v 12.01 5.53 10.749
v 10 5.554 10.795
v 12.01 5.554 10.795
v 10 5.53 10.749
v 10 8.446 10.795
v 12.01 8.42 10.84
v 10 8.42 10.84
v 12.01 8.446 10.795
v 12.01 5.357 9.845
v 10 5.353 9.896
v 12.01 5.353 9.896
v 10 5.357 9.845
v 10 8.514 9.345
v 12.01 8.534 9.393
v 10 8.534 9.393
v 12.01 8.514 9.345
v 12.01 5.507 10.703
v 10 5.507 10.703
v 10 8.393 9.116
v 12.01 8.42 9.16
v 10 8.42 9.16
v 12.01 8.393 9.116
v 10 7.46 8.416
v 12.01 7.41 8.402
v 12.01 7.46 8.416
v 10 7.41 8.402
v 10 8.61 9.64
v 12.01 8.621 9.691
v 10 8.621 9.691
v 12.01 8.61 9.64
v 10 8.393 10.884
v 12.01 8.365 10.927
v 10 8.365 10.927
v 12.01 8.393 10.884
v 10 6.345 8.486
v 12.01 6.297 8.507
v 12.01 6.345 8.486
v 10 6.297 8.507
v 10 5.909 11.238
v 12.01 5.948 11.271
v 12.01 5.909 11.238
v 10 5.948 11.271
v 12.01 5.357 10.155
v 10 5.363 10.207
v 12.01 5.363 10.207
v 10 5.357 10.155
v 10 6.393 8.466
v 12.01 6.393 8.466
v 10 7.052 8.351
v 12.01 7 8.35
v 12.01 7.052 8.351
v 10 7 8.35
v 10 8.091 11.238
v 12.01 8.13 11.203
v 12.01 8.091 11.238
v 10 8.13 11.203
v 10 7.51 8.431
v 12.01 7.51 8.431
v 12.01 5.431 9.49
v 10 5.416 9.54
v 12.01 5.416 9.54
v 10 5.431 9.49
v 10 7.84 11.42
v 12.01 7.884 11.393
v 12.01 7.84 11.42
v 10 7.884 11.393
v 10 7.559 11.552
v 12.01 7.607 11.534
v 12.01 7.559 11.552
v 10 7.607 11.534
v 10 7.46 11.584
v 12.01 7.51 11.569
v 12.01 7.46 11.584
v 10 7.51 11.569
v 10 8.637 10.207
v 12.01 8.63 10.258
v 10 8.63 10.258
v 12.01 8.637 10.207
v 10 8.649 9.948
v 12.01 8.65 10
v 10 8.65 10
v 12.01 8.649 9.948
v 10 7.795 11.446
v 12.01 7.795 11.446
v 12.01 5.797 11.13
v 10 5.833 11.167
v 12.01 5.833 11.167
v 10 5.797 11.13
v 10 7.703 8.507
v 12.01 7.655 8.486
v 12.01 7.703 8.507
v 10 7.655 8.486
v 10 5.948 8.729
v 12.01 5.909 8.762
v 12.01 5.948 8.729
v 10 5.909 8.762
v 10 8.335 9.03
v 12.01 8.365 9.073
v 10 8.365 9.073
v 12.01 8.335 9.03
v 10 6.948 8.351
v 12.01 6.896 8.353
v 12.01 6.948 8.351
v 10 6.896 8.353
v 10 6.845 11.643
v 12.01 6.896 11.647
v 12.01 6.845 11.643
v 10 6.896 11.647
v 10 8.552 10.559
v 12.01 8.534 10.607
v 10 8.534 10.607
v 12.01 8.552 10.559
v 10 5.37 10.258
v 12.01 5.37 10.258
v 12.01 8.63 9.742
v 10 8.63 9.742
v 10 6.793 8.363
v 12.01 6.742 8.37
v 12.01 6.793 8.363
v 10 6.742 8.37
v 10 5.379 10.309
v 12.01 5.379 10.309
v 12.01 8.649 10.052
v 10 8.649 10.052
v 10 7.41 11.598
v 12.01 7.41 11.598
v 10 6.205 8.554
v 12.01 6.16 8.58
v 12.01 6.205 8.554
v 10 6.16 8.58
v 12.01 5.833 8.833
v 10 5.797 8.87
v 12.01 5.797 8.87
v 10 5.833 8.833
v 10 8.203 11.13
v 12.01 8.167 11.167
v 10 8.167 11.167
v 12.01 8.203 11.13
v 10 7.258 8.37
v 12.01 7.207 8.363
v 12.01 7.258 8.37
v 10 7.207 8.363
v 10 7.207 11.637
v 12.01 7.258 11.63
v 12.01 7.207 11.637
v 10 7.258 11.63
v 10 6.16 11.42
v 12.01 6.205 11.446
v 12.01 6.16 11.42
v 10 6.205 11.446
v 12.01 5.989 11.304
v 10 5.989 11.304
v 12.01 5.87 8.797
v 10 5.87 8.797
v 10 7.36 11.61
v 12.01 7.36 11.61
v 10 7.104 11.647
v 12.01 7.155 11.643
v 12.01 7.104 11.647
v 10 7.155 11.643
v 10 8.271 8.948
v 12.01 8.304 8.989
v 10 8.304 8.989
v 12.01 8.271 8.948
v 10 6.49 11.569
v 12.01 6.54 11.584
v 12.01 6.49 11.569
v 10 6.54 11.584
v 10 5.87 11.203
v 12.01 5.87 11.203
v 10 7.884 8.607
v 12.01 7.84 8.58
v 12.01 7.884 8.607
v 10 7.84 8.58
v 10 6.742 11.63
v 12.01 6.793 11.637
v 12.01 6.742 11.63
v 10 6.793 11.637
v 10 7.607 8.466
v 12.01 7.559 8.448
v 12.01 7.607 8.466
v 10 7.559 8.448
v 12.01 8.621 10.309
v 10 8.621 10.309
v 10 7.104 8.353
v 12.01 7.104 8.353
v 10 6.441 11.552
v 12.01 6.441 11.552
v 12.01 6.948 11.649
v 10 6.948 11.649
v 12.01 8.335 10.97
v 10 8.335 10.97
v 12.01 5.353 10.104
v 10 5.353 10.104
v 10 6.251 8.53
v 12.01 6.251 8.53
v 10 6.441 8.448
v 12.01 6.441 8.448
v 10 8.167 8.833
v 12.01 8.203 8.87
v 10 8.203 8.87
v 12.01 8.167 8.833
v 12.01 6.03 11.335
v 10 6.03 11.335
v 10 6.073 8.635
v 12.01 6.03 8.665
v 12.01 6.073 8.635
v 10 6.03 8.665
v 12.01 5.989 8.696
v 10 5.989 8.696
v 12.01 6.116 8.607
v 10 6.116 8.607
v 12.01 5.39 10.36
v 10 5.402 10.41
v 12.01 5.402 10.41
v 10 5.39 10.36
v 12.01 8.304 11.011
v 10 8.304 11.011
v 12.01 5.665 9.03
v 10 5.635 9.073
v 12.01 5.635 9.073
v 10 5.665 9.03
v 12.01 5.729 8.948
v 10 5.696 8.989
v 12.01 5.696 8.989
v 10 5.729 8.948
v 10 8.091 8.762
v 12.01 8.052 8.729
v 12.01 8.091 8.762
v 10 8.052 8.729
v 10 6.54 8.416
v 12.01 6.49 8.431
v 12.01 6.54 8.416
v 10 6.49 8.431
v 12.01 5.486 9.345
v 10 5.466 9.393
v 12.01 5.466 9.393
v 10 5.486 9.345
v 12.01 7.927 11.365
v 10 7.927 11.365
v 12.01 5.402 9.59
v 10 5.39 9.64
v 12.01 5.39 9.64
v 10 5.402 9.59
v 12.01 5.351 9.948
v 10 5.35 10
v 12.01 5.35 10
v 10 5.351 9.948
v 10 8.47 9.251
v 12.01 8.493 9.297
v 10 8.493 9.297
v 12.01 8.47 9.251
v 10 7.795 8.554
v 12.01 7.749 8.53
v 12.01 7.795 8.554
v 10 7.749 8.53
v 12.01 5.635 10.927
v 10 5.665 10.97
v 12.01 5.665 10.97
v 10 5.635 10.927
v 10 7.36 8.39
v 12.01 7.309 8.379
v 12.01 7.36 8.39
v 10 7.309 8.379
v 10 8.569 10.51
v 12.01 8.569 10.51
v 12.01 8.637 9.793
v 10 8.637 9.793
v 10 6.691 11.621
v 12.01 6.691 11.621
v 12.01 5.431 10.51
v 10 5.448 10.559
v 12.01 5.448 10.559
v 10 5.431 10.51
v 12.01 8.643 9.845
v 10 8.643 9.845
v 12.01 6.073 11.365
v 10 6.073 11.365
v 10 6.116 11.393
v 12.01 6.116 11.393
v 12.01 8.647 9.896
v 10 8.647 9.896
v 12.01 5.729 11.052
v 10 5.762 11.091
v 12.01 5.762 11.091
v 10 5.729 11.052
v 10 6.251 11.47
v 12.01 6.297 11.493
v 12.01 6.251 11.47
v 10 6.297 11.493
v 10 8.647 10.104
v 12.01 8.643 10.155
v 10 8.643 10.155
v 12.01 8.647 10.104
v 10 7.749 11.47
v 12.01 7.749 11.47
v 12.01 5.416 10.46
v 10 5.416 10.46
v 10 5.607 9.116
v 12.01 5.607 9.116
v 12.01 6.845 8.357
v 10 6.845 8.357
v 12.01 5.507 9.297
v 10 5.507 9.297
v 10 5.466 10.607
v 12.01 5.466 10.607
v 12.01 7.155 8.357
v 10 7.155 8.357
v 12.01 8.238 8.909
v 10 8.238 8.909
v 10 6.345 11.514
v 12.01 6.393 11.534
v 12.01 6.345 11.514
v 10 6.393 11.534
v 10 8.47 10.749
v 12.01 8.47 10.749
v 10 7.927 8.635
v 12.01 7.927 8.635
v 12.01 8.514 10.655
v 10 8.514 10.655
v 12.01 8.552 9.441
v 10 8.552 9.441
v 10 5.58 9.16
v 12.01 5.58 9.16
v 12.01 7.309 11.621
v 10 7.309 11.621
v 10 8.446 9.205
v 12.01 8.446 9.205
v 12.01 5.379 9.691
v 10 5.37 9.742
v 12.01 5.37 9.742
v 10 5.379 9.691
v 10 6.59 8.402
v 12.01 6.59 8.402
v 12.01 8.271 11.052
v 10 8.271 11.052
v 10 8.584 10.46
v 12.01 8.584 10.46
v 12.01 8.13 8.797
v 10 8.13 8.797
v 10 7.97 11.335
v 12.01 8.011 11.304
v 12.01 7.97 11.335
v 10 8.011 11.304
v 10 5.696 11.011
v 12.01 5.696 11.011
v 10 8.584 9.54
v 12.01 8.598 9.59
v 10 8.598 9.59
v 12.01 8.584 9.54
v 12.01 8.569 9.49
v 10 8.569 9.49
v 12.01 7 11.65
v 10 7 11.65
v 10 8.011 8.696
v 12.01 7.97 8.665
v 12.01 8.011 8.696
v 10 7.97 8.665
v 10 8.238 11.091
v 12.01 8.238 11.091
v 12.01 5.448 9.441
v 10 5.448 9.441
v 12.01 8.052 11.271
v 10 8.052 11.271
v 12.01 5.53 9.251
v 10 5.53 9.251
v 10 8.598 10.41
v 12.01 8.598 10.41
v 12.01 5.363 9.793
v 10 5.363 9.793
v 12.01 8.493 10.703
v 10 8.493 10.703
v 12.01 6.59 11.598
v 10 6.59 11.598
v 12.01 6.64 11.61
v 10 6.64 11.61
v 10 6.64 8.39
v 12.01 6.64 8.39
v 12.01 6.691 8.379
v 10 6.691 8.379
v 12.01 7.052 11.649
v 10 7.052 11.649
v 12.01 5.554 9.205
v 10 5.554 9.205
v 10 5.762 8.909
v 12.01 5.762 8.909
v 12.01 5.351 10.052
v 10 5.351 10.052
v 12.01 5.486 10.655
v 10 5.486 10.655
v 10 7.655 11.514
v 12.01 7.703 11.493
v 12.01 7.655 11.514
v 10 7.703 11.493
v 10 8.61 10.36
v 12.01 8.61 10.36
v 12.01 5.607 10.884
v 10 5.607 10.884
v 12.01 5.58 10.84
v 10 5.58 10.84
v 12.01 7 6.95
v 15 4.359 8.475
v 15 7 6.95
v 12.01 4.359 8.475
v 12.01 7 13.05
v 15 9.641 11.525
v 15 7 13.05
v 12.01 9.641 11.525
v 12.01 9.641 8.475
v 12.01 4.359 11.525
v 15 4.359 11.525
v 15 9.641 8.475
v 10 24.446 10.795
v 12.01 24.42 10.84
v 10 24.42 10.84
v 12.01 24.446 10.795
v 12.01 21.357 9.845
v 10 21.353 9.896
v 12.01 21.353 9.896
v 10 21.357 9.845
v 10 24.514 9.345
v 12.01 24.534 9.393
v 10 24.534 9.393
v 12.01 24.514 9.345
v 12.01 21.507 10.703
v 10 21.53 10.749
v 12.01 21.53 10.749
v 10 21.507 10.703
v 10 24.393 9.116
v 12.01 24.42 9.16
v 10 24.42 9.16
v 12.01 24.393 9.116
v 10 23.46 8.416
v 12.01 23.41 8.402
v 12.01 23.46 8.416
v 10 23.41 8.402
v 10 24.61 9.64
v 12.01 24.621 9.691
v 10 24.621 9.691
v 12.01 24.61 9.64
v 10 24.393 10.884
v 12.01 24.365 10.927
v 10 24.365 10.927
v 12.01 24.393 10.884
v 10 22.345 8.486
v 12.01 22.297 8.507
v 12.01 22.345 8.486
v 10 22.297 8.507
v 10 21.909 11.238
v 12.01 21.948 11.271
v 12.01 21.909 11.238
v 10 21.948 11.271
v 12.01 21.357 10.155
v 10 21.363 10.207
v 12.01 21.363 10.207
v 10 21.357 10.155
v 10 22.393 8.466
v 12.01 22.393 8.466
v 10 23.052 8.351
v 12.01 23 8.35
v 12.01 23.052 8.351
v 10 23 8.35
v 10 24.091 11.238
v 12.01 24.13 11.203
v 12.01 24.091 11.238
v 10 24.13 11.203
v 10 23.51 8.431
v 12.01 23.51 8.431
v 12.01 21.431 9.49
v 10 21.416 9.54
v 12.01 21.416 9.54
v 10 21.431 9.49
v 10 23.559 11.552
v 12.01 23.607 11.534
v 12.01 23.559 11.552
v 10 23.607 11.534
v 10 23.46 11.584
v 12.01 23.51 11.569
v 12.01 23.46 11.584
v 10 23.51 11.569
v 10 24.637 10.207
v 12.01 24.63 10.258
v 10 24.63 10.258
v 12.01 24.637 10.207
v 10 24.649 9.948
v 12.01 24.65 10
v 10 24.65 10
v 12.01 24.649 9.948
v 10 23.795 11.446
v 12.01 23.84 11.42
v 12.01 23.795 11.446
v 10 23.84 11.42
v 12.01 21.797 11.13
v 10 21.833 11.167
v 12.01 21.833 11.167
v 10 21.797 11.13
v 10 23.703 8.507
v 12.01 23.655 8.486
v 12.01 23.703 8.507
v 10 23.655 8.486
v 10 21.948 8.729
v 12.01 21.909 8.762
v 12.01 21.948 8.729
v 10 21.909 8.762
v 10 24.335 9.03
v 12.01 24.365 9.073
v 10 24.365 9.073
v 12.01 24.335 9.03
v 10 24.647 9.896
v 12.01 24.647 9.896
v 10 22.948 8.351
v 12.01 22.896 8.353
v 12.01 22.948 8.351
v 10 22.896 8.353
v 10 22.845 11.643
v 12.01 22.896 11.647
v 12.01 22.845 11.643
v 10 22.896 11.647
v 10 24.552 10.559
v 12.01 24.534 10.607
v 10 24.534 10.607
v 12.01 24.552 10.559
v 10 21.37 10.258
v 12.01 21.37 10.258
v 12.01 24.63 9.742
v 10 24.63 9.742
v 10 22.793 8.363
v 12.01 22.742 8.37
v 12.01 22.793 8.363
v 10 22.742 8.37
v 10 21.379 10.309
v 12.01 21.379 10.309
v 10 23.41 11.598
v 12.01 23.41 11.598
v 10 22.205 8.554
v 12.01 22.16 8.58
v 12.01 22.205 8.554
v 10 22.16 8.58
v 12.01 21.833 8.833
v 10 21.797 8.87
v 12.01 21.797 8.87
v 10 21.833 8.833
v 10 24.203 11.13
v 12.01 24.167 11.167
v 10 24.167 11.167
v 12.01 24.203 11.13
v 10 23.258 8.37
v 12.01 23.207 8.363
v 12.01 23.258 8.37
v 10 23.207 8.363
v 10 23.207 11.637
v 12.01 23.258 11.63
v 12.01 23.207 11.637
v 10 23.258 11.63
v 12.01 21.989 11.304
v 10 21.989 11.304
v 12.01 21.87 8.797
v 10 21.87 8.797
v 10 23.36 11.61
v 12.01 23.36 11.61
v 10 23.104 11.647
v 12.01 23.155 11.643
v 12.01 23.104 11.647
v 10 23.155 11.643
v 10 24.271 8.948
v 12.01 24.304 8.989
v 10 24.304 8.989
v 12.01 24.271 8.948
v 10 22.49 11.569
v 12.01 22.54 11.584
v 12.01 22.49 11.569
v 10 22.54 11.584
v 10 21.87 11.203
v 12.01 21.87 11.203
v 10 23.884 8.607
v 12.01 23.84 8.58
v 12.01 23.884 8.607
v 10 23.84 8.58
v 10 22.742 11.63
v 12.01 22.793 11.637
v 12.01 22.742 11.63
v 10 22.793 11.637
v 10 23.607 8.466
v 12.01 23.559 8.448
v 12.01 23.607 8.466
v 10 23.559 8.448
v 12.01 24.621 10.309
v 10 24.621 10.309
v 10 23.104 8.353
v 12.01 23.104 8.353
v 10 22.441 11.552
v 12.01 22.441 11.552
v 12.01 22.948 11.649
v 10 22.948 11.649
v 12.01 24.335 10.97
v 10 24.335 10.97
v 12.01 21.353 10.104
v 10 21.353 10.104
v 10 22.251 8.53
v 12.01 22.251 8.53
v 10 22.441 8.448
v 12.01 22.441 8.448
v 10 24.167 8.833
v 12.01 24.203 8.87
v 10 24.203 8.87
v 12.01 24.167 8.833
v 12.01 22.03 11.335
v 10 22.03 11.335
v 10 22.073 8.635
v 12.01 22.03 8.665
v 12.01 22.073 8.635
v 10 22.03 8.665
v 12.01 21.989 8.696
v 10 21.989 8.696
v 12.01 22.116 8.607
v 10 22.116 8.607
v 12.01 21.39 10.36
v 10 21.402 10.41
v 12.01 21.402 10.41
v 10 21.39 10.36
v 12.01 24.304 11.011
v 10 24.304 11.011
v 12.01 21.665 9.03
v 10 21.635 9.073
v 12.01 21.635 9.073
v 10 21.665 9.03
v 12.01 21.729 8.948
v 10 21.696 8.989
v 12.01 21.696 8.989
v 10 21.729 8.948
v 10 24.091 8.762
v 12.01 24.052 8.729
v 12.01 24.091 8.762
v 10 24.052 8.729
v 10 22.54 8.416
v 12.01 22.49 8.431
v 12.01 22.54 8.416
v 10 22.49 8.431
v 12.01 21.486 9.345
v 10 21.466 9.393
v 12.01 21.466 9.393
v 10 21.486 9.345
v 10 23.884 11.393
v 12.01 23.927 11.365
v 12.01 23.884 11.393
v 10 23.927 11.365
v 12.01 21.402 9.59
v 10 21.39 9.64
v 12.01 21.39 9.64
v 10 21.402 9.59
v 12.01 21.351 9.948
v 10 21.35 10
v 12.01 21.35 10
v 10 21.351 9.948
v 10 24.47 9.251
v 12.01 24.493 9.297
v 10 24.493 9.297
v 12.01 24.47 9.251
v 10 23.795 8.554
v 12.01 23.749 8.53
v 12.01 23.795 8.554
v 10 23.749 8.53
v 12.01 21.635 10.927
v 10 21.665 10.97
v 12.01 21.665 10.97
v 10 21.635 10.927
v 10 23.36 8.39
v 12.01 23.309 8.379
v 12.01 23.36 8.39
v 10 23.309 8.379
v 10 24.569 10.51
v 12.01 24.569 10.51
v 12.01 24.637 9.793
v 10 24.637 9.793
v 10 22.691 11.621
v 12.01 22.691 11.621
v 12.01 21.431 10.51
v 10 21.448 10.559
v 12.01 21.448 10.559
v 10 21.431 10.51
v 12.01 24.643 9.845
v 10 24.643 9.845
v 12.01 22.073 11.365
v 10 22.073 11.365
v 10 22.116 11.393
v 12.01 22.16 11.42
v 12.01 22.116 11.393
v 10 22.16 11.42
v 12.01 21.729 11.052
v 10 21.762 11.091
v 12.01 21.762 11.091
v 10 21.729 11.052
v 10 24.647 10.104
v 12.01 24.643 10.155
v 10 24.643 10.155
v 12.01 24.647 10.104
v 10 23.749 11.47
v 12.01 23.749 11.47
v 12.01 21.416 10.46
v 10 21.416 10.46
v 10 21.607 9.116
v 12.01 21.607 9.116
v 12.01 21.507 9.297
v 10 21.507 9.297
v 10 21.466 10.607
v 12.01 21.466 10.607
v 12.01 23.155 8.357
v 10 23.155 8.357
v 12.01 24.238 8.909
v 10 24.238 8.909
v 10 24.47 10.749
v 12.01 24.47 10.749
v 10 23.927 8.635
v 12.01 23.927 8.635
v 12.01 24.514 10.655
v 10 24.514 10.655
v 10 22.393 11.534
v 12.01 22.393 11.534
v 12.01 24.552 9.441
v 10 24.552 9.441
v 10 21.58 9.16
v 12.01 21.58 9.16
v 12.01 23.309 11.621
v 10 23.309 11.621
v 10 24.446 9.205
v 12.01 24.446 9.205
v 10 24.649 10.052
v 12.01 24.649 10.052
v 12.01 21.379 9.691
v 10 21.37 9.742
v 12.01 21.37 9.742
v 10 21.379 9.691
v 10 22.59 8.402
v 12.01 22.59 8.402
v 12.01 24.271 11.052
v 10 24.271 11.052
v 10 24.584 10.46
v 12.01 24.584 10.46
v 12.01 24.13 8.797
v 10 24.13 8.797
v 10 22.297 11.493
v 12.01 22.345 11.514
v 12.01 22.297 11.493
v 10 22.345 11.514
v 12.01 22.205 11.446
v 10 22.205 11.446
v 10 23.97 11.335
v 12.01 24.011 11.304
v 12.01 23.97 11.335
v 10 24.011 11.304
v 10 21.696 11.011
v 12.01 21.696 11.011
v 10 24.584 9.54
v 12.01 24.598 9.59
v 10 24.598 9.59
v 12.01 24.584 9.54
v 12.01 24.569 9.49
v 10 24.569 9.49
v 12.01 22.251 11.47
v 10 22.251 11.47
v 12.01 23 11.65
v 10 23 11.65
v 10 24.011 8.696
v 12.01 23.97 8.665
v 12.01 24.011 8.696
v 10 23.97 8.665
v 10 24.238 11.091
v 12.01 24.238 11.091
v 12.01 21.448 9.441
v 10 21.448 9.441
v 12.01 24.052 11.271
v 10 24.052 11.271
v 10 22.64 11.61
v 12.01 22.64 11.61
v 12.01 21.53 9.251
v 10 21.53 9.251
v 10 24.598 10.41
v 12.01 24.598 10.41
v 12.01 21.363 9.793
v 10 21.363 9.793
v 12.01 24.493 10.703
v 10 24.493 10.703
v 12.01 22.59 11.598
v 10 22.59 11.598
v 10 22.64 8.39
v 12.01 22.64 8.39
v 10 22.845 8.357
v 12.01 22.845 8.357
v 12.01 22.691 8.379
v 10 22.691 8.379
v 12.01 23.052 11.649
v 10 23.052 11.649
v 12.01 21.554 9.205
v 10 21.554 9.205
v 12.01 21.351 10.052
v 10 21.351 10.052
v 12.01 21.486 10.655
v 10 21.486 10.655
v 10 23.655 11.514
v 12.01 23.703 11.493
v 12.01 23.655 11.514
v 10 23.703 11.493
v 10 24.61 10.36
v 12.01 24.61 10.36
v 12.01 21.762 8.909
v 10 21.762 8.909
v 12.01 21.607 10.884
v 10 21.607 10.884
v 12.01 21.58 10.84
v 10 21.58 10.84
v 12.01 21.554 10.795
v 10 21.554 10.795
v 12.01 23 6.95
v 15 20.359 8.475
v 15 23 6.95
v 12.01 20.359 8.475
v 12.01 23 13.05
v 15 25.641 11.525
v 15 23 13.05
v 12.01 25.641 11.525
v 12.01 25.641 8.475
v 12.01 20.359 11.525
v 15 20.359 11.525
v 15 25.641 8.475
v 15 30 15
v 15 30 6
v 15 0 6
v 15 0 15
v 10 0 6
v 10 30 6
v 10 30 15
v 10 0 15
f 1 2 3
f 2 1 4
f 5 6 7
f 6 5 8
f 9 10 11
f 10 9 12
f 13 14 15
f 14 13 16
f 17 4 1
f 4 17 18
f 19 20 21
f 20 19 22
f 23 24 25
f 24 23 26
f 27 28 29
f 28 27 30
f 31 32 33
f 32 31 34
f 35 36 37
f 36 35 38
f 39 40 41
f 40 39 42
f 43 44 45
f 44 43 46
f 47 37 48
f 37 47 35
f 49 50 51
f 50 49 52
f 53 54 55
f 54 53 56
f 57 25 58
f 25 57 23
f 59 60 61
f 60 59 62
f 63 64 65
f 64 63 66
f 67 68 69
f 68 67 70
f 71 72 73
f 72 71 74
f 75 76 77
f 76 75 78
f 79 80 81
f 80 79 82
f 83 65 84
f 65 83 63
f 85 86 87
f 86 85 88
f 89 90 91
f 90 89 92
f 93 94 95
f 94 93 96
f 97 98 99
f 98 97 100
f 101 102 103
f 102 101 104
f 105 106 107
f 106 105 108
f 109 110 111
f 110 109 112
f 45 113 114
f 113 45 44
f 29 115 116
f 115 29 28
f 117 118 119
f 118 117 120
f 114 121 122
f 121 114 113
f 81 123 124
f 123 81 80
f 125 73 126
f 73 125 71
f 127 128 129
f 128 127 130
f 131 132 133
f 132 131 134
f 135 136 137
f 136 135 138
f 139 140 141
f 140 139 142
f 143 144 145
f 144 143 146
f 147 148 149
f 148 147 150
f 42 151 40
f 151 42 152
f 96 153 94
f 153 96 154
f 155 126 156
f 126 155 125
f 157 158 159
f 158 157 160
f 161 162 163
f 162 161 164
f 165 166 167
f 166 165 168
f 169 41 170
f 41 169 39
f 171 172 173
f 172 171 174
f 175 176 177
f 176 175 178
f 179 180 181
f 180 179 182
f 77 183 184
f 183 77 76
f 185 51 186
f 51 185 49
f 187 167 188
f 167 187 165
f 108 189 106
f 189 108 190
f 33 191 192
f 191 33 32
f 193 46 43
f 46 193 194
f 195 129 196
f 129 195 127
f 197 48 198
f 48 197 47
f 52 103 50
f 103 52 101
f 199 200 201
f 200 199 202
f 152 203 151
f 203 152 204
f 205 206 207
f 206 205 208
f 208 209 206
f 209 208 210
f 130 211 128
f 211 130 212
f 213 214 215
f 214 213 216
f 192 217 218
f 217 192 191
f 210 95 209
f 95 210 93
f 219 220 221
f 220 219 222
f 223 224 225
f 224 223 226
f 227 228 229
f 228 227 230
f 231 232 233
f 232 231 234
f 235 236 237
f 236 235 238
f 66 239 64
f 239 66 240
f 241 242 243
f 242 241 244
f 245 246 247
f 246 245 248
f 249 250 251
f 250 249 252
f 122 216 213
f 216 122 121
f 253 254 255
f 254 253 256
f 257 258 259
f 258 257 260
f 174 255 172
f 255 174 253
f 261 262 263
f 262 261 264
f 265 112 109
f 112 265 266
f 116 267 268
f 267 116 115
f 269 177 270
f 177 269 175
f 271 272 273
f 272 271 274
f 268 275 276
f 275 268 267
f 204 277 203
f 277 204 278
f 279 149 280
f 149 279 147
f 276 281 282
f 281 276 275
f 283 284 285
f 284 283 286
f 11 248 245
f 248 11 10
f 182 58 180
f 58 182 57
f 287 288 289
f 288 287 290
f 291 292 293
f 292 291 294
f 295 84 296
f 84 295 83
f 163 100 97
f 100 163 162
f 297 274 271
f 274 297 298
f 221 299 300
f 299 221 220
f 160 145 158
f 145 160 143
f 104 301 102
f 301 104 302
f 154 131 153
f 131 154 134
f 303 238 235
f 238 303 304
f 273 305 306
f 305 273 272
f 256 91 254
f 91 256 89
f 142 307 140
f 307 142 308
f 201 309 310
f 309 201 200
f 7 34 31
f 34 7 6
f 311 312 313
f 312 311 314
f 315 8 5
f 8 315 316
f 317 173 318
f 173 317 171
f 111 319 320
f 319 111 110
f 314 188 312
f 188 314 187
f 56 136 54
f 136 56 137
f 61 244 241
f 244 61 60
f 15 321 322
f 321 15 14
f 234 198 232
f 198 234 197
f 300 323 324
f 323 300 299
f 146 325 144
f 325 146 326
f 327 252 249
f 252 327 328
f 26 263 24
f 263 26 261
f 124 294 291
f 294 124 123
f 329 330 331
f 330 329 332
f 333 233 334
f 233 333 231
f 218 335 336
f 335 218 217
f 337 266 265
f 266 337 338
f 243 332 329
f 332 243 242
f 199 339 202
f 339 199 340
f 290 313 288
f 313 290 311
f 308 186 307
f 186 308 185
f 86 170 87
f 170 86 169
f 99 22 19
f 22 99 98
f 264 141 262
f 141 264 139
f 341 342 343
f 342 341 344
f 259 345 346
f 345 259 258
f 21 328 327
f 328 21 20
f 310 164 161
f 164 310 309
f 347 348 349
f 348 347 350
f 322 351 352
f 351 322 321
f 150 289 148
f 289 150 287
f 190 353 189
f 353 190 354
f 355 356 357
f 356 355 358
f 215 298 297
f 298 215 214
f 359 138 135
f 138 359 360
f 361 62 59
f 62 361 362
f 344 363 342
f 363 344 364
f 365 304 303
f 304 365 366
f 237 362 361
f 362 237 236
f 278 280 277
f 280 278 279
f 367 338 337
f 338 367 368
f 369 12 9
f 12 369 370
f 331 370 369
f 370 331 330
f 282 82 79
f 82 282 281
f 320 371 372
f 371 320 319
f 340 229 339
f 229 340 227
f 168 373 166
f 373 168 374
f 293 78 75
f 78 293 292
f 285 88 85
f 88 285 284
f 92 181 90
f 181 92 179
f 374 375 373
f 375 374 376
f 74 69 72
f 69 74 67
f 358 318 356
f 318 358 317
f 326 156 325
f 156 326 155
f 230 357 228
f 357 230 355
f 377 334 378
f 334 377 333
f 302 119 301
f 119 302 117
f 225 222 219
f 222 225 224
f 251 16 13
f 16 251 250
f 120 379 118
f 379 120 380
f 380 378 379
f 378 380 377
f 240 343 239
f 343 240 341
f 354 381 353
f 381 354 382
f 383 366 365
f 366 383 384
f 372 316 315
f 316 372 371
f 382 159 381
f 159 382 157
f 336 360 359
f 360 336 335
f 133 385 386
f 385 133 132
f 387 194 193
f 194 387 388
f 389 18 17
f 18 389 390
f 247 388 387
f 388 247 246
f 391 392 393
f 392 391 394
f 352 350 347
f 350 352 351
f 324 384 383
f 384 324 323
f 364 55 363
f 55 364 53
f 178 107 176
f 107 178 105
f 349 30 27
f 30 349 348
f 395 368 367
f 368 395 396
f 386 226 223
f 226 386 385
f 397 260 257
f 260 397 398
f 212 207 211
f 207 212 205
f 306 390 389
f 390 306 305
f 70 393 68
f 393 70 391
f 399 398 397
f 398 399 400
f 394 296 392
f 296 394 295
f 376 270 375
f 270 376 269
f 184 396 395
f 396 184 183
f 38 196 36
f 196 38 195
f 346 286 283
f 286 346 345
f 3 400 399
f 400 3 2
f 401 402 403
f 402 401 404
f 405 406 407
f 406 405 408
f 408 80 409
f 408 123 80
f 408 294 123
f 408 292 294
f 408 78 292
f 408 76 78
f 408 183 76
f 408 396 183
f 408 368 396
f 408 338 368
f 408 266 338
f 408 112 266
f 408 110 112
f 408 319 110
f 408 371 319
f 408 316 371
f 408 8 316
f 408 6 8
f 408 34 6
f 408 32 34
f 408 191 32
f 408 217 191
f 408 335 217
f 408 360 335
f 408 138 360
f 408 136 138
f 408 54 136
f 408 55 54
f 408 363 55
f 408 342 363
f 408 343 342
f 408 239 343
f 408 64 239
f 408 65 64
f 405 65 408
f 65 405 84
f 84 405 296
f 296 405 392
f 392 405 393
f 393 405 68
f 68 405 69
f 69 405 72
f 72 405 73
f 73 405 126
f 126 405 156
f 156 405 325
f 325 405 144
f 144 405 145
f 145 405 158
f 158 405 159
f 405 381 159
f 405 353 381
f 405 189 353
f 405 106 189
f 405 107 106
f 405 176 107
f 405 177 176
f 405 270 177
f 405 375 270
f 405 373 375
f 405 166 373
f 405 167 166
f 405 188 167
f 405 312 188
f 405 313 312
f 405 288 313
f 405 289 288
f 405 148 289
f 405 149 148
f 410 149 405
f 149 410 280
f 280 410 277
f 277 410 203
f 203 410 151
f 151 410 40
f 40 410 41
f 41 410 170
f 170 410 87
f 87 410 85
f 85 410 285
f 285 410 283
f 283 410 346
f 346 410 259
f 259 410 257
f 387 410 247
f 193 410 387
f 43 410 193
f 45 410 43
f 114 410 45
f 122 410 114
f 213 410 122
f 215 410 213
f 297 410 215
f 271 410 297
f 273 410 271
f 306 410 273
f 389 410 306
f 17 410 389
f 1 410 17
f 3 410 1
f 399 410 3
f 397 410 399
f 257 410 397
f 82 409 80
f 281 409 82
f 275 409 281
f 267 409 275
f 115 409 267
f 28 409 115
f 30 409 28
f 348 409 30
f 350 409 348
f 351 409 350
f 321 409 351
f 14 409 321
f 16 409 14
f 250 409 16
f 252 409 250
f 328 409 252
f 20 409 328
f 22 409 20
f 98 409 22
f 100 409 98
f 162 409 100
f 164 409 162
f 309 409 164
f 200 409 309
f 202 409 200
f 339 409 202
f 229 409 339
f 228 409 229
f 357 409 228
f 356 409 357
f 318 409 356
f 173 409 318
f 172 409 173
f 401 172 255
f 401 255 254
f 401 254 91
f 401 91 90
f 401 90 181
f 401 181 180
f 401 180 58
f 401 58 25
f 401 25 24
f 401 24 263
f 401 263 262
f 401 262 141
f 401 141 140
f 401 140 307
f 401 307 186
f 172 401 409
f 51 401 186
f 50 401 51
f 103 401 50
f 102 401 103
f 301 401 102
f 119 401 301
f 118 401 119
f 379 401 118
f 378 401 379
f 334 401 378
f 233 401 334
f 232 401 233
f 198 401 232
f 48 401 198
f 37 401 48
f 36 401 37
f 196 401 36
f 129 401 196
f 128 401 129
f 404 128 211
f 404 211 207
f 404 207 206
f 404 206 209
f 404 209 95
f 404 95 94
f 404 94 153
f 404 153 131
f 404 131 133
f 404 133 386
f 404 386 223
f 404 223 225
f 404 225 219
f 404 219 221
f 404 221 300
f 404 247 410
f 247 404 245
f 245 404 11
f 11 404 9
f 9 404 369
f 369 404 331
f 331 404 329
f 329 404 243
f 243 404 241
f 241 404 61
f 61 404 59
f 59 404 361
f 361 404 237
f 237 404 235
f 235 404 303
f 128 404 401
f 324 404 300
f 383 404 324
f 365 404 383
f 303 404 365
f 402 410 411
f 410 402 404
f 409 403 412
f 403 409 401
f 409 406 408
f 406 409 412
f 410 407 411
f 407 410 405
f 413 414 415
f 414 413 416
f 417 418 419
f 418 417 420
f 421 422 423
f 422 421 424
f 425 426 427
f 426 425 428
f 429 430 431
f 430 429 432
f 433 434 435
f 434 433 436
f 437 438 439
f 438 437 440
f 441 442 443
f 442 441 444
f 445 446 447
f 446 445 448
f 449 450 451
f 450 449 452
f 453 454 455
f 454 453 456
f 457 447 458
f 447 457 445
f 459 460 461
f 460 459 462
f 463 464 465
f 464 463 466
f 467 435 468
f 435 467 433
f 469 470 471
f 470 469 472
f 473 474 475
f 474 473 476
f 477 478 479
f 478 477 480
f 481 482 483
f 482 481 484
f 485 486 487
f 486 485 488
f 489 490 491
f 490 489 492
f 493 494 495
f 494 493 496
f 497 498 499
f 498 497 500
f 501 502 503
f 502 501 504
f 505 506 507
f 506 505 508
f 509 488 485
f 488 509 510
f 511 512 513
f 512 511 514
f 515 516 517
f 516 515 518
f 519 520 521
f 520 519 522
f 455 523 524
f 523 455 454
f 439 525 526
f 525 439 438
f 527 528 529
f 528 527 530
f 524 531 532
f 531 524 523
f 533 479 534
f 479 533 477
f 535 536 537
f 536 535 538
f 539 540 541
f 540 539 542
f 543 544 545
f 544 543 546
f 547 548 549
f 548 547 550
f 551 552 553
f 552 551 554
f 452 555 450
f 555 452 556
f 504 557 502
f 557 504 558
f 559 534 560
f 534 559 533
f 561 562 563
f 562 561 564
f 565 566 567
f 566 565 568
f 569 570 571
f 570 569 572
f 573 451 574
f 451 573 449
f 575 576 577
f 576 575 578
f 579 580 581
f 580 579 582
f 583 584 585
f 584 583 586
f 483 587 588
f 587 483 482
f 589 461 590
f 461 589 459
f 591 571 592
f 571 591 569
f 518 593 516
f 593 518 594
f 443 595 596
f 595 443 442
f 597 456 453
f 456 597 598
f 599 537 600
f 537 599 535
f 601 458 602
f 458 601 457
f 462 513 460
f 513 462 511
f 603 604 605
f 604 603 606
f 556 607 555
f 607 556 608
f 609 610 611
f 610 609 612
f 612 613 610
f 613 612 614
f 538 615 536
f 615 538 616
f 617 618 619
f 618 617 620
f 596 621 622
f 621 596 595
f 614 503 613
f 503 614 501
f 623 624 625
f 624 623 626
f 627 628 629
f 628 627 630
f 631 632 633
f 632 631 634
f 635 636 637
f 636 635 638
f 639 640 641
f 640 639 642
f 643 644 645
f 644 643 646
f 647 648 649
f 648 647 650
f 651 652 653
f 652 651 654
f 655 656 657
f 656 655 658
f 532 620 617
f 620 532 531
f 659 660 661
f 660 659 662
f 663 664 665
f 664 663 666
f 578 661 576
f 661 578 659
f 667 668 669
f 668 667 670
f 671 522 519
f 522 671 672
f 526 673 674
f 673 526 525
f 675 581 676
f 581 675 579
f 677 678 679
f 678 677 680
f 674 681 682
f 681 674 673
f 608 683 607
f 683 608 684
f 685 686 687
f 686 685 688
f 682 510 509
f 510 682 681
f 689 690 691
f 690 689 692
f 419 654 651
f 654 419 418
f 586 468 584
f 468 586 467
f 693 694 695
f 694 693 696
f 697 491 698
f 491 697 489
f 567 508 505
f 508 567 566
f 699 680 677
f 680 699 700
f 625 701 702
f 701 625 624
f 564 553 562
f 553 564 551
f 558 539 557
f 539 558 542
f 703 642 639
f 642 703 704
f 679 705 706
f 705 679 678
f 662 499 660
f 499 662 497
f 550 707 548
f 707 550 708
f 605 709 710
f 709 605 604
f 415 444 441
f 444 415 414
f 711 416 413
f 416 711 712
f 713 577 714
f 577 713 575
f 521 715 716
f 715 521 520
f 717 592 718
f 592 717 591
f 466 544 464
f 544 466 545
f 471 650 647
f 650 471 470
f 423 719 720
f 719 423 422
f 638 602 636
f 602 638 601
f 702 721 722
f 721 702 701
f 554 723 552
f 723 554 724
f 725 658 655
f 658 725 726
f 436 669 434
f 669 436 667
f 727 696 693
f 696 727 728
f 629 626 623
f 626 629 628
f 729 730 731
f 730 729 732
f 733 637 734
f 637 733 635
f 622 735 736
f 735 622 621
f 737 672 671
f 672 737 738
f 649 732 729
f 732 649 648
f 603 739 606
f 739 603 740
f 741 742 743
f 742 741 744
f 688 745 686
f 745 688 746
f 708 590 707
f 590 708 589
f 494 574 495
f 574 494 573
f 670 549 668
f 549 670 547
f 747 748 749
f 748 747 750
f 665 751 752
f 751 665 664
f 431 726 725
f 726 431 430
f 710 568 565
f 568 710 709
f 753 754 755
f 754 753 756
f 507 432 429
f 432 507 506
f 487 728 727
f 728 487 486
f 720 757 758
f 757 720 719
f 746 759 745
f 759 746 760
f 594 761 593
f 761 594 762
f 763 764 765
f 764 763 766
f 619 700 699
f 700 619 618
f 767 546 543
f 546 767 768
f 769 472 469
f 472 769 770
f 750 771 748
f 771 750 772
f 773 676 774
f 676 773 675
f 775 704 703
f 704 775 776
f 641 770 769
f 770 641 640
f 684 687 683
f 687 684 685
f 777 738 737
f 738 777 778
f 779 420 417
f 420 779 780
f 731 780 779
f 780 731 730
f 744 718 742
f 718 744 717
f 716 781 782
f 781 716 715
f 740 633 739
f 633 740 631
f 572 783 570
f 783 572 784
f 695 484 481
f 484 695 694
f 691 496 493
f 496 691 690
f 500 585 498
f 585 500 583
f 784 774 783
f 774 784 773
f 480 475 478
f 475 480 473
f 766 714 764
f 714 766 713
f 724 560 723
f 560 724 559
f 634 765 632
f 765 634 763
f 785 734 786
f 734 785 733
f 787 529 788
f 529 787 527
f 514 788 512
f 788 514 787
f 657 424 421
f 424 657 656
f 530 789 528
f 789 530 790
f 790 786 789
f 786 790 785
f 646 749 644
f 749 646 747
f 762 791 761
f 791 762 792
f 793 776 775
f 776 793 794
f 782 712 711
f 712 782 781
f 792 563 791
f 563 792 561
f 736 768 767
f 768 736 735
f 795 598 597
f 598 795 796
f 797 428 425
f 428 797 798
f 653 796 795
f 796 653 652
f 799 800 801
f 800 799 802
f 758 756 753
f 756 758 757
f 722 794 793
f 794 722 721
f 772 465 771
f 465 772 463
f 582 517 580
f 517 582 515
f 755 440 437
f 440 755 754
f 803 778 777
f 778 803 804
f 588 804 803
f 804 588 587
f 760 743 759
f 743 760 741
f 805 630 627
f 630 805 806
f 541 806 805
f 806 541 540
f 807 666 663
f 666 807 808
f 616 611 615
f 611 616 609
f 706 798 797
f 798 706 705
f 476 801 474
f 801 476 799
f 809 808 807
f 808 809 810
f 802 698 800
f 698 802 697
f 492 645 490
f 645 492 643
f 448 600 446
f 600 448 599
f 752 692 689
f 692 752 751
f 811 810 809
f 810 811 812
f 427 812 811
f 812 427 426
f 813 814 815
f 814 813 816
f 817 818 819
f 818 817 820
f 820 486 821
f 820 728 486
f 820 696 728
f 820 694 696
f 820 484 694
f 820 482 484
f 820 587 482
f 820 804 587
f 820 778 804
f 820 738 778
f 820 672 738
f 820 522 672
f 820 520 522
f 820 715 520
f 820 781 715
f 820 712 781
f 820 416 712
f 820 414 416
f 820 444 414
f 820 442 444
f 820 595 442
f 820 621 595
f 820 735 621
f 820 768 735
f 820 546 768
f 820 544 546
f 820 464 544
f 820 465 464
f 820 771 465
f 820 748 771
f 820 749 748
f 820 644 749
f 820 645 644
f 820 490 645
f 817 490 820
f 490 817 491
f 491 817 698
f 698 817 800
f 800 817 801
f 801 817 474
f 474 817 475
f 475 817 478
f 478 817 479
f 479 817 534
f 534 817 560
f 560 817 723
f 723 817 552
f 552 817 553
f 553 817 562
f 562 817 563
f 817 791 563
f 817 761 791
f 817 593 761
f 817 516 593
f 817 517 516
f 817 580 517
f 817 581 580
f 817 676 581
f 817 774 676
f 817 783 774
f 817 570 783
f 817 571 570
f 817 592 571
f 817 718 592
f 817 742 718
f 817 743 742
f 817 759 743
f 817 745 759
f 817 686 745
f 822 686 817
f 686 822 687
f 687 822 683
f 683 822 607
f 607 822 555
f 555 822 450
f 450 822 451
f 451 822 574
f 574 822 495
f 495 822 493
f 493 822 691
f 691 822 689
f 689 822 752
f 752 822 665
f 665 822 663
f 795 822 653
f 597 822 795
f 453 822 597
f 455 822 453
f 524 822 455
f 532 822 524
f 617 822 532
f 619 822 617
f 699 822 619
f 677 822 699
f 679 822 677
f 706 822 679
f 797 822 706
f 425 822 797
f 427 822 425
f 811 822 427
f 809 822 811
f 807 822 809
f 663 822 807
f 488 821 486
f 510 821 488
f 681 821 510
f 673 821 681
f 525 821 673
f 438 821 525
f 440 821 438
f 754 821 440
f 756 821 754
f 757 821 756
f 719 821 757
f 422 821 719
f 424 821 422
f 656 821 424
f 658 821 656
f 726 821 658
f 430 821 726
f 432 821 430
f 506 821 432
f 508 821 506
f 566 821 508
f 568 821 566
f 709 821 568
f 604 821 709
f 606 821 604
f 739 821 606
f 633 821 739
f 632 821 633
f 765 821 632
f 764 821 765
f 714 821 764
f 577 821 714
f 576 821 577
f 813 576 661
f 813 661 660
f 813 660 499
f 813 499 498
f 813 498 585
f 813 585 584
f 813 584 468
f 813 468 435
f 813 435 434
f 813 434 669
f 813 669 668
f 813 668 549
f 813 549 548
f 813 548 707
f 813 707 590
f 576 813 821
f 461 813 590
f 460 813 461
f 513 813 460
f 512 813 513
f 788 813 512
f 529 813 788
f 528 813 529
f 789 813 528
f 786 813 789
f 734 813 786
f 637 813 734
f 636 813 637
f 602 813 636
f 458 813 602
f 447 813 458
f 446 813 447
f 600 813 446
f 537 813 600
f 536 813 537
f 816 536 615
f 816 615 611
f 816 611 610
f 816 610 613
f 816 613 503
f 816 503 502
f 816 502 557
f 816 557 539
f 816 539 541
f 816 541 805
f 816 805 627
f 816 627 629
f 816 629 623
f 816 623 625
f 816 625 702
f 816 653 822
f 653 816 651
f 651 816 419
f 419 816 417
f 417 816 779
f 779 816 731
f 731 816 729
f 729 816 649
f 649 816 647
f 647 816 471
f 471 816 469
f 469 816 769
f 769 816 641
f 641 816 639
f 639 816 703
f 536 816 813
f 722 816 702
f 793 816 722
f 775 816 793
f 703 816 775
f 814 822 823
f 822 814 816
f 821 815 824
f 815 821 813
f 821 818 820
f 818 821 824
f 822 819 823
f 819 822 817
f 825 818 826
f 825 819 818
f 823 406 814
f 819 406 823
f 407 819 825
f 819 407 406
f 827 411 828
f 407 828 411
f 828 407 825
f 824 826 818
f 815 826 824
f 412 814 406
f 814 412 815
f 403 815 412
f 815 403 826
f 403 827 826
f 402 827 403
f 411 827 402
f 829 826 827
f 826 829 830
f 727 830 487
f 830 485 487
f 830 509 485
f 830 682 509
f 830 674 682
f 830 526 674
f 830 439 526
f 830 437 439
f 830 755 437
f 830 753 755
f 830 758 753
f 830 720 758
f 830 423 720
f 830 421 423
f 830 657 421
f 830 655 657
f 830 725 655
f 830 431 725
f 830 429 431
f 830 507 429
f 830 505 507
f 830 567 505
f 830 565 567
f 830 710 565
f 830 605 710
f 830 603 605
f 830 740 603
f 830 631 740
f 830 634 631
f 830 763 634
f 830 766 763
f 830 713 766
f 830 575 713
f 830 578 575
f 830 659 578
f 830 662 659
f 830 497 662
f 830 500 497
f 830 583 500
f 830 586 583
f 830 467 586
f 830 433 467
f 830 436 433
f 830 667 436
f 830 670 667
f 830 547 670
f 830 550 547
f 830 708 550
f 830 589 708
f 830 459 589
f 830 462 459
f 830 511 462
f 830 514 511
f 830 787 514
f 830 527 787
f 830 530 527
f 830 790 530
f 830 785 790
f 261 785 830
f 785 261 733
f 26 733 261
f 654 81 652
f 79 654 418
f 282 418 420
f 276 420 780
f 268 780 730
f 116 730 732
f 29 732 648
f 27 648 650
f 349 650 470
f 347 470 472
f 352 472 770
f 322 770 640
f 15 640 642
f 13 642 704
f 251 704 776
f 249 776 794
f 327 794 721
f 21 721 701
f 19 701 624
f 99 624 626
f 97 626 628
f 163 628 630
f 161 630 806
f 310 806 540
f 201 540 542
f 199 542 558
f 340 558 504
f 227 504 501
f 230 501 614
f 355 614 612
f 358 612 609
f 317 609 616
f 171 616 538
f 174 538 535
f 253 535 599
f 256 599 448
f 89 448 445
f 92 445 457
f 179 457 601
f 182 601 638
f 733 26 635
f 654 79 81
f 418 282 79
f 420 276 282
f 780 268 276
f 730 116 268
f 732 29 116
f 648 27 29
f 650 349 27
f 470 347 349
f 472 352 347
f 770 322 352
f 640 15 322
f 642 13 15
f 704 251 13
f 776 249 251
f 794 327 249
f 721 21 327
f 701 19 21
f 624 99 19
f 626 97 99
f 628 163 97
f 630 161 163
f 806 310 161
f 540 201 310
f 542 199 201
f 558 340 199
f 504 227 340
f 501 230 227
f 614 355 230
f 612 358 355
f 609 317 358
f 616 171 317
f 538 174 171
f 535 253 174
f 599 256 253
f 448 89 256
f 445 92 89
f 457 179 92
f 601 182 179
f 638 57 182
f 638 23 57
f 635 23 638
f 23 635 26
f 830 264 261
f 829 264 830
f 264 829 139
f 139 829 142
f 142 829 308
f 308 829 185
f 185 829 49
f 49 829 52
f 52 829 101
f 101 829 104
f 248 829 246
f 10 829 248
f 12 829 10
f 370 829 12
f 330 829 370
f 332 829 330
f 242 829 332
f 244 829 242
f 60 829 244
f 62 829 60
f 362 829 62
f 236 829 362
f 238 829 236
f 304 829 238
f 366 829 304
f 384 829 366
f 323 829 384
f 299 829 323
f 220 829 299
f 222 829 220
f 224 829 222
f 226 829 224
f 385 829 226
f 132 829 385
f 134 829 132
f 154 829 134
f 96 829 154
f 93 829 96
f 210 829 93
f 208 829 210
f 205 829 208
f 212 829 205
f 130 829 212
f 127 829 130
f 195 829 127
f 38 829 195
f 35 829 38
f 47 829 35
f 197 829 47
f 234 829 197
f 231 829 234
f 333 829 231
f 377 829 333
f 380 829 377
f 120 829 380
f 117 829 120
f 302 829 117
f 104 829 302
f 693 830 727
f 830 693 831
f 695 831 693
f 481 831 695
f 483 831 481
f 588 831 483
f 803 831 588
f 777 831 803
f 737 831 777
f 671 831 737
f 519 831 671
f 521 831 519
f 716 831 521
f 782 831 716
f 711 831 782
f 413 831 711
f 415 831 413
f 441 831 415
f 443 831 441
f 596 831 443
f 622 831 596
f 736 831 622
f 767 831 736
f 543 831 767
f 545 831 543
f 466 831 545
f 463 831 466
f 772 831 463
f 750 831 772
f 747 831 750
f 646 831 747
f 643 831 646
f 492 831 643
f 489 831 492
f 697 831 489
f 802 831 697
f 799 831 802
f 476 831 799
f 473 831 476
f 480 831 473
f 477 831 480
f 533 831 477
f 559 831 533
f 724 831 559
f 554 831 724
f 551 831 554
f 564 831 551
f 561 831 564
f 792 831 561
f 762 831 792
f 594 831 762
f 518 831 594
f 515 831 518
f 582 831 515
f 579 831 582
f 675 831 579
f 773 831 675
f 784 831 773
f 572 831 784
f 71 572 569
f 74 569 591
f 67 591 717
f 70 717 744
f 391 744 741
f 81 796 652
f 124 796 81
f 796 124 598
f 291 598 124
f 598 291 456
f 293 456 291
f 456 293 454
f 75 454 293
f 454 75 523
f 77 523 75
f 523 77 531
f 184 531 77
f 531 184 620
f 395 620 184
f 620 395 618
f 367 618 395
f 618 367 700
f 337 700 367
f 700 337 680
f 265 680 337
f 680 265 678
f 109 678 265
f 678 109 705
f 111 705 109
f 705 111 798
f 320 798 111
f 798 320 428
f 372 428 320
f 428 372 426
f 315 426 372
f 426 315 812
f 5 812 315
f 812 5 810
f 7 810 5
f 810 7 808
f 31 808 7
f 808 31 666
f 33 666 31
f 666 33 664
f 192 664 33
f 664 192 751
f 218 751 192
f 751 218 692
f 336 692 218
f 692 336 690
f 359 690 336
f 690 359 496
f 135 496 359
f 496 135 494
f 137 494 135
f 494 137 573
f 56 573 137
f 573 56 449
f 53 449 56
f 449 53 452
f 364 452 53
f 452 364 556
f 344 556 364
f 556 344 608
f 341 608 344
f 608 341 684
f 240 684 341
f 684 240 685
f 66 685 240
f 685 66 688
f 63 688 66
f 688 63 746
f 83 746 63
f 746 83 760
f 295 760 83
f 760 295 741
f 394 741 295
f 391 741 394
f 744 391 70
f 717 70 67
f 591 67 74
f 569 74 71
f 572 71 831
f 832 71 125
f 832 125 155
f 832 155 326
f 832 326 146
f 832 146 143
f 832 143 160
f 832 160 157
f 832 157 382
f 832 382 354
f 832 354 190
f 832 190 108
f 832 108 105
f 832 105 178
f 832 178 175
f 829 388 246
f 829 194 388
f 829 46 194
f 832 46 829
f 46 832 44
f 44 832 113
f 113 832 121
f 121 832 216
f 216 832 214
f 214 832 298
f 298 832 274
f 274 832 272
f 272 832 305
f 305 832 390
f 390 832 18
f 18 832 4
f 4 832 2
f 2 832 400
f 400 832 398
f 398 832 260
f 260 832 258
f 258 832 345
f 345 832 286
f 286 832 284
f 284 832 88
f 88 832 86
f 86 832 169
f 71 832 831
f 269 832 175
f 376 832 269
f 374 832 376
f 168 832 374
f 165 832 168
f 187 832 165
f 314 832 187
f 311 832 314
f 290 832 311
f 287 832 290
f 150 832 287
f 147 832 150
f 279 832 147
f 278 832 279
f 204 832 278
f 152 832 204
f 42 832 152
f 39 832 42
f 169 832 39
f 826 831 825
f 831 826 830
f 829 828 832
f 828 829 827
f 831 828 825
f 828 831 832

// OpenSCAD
// robot bumper v2, weniger drucken, mehr schrauben

module base(){
    difference(){
        union(){
            cube([30,30,5]);
            translate([-5,0,0])
            cube([5,30,50]);
        }
        
        // führungslöcher
        translate([-10,7,10])
        rotate([0,90,0])
        cylinder(r=1.65, h=20, $fn=200);
        
        translate([-10,23,10])
        rotate([0,90,0])
        cylinder(r=1.65, h=20, $fn=200);
        
        translate([-10,23,45])
        rotate([0,90,0])
        cylinder(r=1.65, h=20, $fn=200);
        
        translate([-10,7,45])
        rotate([0,90,0])
        cylinder(r=1.65, h=20, $fn=200);
        
        // schraublöcher
        translate([7, 7, -5])
        cylinder(r=1.6, h=20, $fn=200);
        
        translate([23, 7, -5])
        cylinder(r=1.6, h=20, $fn=200);     
        
        translate([23, 23, -5])
        cylinder(r=1.6, h=20, $fn=200);     
        
        translate([7, 23, -5])
        cylinder(r=1.6, h=20, $fn=200);
    
        // switch-schalter
        // 20 lang, 6.4 breit, 10.2 hoch
        translate([-6,15-6.5/2,20-2.5])
        cube([10.2,6.5,20.5]);
    }
}

module bumper(){
    difference(){
        translate([-17,0,0])
        cube([5,30,50]);  
        
        // führungslöcher
        translate([-20,7,10]){
            rotate([0,90,0])
            cylinder(r=1.65, h=20, $fn=200);
            
            rotate([0,90,0])
            translate([0,0,7.01])
            cylinder(r=6.1/2, h=3, $fn=6);
            
                        rotate([0,90,0])
            translate([0,0,2.99])
            cylinder(r=5.4/2, h=3, $fn=200);
        }
        
        translate([-20,23,10]){
            rotate([0,90,0])
            cylinder(r=1.65, h=20, $fn=200);
            
            rotate([0,90,0])
            translate([0,0,7.01])
            cylinder(r=6.1/2, h=3, $fn=6);            
                        rotate([0,90,0])
            translate([0,0,2.99])
            cylinder(r=5.4/2, h=3, $fn=200);
        }
        
        translate([-20,23,45]){
            rotate([0,90,0])
            cylinder(r=1.65, h=20, $fn=200);
            
            rotate([0,90,0])
            translate([0,0,7.01])
            cylinder(r=6.1/2, h=3, $fn=6);     
     
            rotate([0,90,0])
            translate([0,0,2.99])
            cylinder(r=5.4/2, h=3, $fn=200);          
        }
        
        translate([-20,7,45]){
            rotate([0,90,0])
            cylinder(r=1.65, h=20, $fn=200);
            
            rotate([0,90,0])
            translate([0,0,7.01])
            cylinder(r=6.1/2, h=3, $fn=6);            
                        rotate([0,90,0])
            translate([0,0,2.99])
            cylinder(r=5.4/2, h=3, $fn=200);
        }
    }
}

module anchor(){
    difference(){
        translate([10,0,6])
        cube([5,30,43]);
        
        translate([9.99,5,15])
        cube([5.2,20,25]);
        
        translate([5,7,10]){
            rotate([0,90,0])
            cylinder(r=1.65, h=20, $fn=200);
            
            rotate([0,90,0])
            translate([0,0,7.01])
            cylinder(r=6.1/2, h=3, $fn=6);
        }
        
        translate([5,23,10]){
            rotate([0,90,0])
            cylinder(r=1.65, h=20, $fn=200);
            
            rotate([0,90,0])
            translate([0,0,7.01])
            cylinder(r=6.1/2, h=3, $fn=6);
        }        
        
        translate([5,23,45]){
            rotate([0,90,0])
            cylinder(r=1.65, h=20, $fn=200);
            
            rotate([0,90,0])
            translate([0,0,7.01])
            cylinder(r=6.1/2, h=3, $fn=6);
        }    
   
        translate([5,7,45]){
            rotate([0,90,0])
            cylinder(r=1.65, h=20, $fn=200);
            
            rotate([0,90,0])
            translate([0,0,7.01])
            cylinder(r=6.1/2, h=3, $fn=6);
        }    
        
    }
}

difference(){
    union(){
        //base();
        //bumper();
        anchor();
    }
    // cutout for proof of concept
    translate([-50, -50,15])
    cube([100,100,100]);
}
